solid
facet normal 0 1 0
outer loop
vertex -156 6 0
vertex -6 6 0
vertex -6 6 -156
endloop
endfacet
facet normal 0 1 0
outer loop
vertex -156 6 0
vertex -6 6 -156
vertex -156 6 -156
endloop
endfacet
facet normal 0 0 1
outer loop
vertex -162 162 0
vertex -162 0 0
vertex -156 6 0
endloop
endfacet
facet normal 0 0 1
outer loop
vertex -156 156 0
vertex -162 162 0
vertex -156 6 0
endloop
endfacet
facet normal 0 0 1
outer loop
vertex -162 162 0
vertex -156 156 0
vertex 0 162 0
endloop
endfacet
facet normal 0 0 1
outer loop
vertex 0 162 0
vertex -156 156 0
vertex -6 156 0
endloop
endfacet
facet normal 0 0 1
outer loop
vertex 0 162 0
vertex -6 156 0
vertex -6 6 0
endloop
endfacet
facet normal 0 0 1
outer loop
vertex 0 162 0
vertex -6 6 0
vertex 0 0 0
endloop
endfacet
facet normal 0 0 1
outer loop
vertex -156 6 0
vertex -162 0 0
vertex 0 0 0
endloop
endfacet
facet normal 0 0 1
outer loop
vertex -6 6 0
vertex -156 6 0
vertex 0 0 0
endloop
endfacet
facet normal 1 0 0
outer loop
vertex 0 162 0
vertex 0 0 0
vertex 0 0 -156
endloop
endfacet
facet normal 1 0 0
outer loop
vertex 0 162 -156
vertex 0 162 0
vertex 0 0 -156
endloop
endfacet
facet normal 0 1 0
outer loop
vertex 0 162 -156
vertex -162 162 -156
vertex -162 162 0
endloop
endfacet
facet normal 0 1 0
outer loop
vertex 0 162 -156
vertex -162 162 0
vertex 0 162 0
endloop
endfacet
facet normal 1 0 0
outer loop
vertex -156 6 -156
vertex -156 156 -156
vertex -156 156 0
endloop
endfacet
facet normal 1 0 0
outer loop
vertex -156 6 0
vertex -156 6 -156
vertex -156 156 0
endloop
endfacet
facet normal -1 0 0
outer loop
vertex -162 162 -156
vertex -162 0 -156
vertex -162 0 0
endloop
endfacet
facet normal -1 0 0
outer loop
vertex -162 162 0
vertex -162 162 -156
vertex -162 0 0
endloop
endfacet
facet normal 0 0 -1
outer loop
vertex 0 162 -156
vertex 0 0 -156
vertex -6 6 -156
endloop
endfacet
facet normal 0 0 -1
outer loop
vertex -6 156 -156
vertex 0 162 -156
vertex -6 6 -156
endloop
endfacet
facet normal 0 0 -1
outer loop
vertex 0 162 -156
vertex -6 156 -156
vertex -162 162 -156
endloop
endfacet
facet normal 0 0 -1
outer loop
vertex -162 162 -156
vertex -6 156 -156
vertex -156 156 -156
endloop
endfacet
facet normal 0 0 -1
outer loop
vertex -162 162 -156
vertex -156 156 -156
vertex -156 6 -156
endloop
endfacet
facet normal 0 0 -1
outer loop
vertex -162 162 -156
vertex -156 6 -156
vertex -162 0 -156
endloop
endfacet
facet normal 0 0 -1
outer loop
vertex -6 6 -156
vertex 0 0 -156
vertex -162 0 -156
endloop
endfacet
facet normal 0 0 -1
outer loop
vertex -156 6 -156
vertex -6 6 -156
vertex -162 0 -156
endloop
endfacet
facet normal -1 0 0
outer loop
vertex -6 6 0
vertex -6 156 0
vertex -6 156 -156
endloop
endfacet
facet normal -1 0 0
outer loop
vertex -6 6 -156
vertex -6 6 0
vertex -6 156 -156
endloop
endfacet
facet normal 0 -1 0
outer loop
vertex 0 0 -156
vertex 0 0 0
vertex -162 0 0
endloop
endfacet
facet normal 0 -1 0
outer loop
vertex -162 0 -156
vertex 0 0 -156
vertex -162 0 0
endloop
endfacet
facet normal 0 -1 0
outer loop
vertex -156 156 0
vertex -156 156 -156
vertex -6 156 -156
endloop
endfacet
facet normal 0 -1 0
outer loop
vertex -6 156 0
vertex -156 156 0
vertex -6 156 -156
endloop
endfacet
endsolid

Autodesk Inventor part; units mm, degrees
ref_plane "YZ Plane" through (0, 0, 0) normal (1, 0, 0) x (0, 1, 0)
ref_plane "XZ Plane" through (0, 0, 0) normal (0, 1, 0) x (-1, 0, 0)
ref_plane "XY Plane" through (0, 0, 0) normal (0, 0, 1) x (1, 0, 0)
sketch "Sketch1" plane through (0, 0, 0) normal (0, 1, 0) x (-1, 0, 0)
  line L0 (0, 0) -> (162, 0)
  line L1 (162, 0) -> (162, -156)
  line L2 (162, -156) -> (0, -156)
  line L3 (0, -156) -> (0, 0)
  dimension "d0" = 162
  dimension "d1" = 156
extrude "Extrusion1" add sketch "Sketch1" along normal blind 6
sketch "Sketch3" plane through (0, 0, 0) normal (1, 0, 0) x (0, 0, -1)
  line L0 (156, 6) -> (0, 6) projected
  line L1 (0, 6) -> (156, 6)
  line L2 (156, 6) -> (156, 156)
  line L3 (156, 156) -> (0, 156)
  line L4 (0, 156) -> (0, 6)
  point P0 (0, 0)
  dimension "d4" = 150
extrude "Extrusion2" add sketch "Sketch3" against normal blind 6
sketch "Sketch4" plane through (-162, 0, -156) normal (-1, 0, 0) x (0, 0, 1)
  line L0 (0, 6) -> (156, 6) projected
  line L1 (156, 156) -> (0, 156) projected
  line L2 (0, 6) -> (156, 6)
  line L3 (156, 6) -> (156, 156)
  line L4 (156, 156) -> (0, 156)
  line L5 (0, 156) -> (0, 6)
  point P0 (156, 0)
extrude "Extrusion3" add sketch "Sketch4" against normal blind 6
sketch "Sketch5" plane through (-162, 156, 0) normal (0, 1, 0) x (1, 0, 0)
  line L0 (0, 156) -> (0, 0) projected
  line L1 (162, 156) -> (0, 156)
  line L2 (0, 156) -> (0, 0)
  line L3 (0, 0) -> (162, 0)
  line L4 (162, 0) -> (162, 156)
  point P0 (162, 0)
extrude "Extrusion4" add sketch "Sketch5" along normal blind 6
properties part number "Estacion" material "Wood (Cherry)"
